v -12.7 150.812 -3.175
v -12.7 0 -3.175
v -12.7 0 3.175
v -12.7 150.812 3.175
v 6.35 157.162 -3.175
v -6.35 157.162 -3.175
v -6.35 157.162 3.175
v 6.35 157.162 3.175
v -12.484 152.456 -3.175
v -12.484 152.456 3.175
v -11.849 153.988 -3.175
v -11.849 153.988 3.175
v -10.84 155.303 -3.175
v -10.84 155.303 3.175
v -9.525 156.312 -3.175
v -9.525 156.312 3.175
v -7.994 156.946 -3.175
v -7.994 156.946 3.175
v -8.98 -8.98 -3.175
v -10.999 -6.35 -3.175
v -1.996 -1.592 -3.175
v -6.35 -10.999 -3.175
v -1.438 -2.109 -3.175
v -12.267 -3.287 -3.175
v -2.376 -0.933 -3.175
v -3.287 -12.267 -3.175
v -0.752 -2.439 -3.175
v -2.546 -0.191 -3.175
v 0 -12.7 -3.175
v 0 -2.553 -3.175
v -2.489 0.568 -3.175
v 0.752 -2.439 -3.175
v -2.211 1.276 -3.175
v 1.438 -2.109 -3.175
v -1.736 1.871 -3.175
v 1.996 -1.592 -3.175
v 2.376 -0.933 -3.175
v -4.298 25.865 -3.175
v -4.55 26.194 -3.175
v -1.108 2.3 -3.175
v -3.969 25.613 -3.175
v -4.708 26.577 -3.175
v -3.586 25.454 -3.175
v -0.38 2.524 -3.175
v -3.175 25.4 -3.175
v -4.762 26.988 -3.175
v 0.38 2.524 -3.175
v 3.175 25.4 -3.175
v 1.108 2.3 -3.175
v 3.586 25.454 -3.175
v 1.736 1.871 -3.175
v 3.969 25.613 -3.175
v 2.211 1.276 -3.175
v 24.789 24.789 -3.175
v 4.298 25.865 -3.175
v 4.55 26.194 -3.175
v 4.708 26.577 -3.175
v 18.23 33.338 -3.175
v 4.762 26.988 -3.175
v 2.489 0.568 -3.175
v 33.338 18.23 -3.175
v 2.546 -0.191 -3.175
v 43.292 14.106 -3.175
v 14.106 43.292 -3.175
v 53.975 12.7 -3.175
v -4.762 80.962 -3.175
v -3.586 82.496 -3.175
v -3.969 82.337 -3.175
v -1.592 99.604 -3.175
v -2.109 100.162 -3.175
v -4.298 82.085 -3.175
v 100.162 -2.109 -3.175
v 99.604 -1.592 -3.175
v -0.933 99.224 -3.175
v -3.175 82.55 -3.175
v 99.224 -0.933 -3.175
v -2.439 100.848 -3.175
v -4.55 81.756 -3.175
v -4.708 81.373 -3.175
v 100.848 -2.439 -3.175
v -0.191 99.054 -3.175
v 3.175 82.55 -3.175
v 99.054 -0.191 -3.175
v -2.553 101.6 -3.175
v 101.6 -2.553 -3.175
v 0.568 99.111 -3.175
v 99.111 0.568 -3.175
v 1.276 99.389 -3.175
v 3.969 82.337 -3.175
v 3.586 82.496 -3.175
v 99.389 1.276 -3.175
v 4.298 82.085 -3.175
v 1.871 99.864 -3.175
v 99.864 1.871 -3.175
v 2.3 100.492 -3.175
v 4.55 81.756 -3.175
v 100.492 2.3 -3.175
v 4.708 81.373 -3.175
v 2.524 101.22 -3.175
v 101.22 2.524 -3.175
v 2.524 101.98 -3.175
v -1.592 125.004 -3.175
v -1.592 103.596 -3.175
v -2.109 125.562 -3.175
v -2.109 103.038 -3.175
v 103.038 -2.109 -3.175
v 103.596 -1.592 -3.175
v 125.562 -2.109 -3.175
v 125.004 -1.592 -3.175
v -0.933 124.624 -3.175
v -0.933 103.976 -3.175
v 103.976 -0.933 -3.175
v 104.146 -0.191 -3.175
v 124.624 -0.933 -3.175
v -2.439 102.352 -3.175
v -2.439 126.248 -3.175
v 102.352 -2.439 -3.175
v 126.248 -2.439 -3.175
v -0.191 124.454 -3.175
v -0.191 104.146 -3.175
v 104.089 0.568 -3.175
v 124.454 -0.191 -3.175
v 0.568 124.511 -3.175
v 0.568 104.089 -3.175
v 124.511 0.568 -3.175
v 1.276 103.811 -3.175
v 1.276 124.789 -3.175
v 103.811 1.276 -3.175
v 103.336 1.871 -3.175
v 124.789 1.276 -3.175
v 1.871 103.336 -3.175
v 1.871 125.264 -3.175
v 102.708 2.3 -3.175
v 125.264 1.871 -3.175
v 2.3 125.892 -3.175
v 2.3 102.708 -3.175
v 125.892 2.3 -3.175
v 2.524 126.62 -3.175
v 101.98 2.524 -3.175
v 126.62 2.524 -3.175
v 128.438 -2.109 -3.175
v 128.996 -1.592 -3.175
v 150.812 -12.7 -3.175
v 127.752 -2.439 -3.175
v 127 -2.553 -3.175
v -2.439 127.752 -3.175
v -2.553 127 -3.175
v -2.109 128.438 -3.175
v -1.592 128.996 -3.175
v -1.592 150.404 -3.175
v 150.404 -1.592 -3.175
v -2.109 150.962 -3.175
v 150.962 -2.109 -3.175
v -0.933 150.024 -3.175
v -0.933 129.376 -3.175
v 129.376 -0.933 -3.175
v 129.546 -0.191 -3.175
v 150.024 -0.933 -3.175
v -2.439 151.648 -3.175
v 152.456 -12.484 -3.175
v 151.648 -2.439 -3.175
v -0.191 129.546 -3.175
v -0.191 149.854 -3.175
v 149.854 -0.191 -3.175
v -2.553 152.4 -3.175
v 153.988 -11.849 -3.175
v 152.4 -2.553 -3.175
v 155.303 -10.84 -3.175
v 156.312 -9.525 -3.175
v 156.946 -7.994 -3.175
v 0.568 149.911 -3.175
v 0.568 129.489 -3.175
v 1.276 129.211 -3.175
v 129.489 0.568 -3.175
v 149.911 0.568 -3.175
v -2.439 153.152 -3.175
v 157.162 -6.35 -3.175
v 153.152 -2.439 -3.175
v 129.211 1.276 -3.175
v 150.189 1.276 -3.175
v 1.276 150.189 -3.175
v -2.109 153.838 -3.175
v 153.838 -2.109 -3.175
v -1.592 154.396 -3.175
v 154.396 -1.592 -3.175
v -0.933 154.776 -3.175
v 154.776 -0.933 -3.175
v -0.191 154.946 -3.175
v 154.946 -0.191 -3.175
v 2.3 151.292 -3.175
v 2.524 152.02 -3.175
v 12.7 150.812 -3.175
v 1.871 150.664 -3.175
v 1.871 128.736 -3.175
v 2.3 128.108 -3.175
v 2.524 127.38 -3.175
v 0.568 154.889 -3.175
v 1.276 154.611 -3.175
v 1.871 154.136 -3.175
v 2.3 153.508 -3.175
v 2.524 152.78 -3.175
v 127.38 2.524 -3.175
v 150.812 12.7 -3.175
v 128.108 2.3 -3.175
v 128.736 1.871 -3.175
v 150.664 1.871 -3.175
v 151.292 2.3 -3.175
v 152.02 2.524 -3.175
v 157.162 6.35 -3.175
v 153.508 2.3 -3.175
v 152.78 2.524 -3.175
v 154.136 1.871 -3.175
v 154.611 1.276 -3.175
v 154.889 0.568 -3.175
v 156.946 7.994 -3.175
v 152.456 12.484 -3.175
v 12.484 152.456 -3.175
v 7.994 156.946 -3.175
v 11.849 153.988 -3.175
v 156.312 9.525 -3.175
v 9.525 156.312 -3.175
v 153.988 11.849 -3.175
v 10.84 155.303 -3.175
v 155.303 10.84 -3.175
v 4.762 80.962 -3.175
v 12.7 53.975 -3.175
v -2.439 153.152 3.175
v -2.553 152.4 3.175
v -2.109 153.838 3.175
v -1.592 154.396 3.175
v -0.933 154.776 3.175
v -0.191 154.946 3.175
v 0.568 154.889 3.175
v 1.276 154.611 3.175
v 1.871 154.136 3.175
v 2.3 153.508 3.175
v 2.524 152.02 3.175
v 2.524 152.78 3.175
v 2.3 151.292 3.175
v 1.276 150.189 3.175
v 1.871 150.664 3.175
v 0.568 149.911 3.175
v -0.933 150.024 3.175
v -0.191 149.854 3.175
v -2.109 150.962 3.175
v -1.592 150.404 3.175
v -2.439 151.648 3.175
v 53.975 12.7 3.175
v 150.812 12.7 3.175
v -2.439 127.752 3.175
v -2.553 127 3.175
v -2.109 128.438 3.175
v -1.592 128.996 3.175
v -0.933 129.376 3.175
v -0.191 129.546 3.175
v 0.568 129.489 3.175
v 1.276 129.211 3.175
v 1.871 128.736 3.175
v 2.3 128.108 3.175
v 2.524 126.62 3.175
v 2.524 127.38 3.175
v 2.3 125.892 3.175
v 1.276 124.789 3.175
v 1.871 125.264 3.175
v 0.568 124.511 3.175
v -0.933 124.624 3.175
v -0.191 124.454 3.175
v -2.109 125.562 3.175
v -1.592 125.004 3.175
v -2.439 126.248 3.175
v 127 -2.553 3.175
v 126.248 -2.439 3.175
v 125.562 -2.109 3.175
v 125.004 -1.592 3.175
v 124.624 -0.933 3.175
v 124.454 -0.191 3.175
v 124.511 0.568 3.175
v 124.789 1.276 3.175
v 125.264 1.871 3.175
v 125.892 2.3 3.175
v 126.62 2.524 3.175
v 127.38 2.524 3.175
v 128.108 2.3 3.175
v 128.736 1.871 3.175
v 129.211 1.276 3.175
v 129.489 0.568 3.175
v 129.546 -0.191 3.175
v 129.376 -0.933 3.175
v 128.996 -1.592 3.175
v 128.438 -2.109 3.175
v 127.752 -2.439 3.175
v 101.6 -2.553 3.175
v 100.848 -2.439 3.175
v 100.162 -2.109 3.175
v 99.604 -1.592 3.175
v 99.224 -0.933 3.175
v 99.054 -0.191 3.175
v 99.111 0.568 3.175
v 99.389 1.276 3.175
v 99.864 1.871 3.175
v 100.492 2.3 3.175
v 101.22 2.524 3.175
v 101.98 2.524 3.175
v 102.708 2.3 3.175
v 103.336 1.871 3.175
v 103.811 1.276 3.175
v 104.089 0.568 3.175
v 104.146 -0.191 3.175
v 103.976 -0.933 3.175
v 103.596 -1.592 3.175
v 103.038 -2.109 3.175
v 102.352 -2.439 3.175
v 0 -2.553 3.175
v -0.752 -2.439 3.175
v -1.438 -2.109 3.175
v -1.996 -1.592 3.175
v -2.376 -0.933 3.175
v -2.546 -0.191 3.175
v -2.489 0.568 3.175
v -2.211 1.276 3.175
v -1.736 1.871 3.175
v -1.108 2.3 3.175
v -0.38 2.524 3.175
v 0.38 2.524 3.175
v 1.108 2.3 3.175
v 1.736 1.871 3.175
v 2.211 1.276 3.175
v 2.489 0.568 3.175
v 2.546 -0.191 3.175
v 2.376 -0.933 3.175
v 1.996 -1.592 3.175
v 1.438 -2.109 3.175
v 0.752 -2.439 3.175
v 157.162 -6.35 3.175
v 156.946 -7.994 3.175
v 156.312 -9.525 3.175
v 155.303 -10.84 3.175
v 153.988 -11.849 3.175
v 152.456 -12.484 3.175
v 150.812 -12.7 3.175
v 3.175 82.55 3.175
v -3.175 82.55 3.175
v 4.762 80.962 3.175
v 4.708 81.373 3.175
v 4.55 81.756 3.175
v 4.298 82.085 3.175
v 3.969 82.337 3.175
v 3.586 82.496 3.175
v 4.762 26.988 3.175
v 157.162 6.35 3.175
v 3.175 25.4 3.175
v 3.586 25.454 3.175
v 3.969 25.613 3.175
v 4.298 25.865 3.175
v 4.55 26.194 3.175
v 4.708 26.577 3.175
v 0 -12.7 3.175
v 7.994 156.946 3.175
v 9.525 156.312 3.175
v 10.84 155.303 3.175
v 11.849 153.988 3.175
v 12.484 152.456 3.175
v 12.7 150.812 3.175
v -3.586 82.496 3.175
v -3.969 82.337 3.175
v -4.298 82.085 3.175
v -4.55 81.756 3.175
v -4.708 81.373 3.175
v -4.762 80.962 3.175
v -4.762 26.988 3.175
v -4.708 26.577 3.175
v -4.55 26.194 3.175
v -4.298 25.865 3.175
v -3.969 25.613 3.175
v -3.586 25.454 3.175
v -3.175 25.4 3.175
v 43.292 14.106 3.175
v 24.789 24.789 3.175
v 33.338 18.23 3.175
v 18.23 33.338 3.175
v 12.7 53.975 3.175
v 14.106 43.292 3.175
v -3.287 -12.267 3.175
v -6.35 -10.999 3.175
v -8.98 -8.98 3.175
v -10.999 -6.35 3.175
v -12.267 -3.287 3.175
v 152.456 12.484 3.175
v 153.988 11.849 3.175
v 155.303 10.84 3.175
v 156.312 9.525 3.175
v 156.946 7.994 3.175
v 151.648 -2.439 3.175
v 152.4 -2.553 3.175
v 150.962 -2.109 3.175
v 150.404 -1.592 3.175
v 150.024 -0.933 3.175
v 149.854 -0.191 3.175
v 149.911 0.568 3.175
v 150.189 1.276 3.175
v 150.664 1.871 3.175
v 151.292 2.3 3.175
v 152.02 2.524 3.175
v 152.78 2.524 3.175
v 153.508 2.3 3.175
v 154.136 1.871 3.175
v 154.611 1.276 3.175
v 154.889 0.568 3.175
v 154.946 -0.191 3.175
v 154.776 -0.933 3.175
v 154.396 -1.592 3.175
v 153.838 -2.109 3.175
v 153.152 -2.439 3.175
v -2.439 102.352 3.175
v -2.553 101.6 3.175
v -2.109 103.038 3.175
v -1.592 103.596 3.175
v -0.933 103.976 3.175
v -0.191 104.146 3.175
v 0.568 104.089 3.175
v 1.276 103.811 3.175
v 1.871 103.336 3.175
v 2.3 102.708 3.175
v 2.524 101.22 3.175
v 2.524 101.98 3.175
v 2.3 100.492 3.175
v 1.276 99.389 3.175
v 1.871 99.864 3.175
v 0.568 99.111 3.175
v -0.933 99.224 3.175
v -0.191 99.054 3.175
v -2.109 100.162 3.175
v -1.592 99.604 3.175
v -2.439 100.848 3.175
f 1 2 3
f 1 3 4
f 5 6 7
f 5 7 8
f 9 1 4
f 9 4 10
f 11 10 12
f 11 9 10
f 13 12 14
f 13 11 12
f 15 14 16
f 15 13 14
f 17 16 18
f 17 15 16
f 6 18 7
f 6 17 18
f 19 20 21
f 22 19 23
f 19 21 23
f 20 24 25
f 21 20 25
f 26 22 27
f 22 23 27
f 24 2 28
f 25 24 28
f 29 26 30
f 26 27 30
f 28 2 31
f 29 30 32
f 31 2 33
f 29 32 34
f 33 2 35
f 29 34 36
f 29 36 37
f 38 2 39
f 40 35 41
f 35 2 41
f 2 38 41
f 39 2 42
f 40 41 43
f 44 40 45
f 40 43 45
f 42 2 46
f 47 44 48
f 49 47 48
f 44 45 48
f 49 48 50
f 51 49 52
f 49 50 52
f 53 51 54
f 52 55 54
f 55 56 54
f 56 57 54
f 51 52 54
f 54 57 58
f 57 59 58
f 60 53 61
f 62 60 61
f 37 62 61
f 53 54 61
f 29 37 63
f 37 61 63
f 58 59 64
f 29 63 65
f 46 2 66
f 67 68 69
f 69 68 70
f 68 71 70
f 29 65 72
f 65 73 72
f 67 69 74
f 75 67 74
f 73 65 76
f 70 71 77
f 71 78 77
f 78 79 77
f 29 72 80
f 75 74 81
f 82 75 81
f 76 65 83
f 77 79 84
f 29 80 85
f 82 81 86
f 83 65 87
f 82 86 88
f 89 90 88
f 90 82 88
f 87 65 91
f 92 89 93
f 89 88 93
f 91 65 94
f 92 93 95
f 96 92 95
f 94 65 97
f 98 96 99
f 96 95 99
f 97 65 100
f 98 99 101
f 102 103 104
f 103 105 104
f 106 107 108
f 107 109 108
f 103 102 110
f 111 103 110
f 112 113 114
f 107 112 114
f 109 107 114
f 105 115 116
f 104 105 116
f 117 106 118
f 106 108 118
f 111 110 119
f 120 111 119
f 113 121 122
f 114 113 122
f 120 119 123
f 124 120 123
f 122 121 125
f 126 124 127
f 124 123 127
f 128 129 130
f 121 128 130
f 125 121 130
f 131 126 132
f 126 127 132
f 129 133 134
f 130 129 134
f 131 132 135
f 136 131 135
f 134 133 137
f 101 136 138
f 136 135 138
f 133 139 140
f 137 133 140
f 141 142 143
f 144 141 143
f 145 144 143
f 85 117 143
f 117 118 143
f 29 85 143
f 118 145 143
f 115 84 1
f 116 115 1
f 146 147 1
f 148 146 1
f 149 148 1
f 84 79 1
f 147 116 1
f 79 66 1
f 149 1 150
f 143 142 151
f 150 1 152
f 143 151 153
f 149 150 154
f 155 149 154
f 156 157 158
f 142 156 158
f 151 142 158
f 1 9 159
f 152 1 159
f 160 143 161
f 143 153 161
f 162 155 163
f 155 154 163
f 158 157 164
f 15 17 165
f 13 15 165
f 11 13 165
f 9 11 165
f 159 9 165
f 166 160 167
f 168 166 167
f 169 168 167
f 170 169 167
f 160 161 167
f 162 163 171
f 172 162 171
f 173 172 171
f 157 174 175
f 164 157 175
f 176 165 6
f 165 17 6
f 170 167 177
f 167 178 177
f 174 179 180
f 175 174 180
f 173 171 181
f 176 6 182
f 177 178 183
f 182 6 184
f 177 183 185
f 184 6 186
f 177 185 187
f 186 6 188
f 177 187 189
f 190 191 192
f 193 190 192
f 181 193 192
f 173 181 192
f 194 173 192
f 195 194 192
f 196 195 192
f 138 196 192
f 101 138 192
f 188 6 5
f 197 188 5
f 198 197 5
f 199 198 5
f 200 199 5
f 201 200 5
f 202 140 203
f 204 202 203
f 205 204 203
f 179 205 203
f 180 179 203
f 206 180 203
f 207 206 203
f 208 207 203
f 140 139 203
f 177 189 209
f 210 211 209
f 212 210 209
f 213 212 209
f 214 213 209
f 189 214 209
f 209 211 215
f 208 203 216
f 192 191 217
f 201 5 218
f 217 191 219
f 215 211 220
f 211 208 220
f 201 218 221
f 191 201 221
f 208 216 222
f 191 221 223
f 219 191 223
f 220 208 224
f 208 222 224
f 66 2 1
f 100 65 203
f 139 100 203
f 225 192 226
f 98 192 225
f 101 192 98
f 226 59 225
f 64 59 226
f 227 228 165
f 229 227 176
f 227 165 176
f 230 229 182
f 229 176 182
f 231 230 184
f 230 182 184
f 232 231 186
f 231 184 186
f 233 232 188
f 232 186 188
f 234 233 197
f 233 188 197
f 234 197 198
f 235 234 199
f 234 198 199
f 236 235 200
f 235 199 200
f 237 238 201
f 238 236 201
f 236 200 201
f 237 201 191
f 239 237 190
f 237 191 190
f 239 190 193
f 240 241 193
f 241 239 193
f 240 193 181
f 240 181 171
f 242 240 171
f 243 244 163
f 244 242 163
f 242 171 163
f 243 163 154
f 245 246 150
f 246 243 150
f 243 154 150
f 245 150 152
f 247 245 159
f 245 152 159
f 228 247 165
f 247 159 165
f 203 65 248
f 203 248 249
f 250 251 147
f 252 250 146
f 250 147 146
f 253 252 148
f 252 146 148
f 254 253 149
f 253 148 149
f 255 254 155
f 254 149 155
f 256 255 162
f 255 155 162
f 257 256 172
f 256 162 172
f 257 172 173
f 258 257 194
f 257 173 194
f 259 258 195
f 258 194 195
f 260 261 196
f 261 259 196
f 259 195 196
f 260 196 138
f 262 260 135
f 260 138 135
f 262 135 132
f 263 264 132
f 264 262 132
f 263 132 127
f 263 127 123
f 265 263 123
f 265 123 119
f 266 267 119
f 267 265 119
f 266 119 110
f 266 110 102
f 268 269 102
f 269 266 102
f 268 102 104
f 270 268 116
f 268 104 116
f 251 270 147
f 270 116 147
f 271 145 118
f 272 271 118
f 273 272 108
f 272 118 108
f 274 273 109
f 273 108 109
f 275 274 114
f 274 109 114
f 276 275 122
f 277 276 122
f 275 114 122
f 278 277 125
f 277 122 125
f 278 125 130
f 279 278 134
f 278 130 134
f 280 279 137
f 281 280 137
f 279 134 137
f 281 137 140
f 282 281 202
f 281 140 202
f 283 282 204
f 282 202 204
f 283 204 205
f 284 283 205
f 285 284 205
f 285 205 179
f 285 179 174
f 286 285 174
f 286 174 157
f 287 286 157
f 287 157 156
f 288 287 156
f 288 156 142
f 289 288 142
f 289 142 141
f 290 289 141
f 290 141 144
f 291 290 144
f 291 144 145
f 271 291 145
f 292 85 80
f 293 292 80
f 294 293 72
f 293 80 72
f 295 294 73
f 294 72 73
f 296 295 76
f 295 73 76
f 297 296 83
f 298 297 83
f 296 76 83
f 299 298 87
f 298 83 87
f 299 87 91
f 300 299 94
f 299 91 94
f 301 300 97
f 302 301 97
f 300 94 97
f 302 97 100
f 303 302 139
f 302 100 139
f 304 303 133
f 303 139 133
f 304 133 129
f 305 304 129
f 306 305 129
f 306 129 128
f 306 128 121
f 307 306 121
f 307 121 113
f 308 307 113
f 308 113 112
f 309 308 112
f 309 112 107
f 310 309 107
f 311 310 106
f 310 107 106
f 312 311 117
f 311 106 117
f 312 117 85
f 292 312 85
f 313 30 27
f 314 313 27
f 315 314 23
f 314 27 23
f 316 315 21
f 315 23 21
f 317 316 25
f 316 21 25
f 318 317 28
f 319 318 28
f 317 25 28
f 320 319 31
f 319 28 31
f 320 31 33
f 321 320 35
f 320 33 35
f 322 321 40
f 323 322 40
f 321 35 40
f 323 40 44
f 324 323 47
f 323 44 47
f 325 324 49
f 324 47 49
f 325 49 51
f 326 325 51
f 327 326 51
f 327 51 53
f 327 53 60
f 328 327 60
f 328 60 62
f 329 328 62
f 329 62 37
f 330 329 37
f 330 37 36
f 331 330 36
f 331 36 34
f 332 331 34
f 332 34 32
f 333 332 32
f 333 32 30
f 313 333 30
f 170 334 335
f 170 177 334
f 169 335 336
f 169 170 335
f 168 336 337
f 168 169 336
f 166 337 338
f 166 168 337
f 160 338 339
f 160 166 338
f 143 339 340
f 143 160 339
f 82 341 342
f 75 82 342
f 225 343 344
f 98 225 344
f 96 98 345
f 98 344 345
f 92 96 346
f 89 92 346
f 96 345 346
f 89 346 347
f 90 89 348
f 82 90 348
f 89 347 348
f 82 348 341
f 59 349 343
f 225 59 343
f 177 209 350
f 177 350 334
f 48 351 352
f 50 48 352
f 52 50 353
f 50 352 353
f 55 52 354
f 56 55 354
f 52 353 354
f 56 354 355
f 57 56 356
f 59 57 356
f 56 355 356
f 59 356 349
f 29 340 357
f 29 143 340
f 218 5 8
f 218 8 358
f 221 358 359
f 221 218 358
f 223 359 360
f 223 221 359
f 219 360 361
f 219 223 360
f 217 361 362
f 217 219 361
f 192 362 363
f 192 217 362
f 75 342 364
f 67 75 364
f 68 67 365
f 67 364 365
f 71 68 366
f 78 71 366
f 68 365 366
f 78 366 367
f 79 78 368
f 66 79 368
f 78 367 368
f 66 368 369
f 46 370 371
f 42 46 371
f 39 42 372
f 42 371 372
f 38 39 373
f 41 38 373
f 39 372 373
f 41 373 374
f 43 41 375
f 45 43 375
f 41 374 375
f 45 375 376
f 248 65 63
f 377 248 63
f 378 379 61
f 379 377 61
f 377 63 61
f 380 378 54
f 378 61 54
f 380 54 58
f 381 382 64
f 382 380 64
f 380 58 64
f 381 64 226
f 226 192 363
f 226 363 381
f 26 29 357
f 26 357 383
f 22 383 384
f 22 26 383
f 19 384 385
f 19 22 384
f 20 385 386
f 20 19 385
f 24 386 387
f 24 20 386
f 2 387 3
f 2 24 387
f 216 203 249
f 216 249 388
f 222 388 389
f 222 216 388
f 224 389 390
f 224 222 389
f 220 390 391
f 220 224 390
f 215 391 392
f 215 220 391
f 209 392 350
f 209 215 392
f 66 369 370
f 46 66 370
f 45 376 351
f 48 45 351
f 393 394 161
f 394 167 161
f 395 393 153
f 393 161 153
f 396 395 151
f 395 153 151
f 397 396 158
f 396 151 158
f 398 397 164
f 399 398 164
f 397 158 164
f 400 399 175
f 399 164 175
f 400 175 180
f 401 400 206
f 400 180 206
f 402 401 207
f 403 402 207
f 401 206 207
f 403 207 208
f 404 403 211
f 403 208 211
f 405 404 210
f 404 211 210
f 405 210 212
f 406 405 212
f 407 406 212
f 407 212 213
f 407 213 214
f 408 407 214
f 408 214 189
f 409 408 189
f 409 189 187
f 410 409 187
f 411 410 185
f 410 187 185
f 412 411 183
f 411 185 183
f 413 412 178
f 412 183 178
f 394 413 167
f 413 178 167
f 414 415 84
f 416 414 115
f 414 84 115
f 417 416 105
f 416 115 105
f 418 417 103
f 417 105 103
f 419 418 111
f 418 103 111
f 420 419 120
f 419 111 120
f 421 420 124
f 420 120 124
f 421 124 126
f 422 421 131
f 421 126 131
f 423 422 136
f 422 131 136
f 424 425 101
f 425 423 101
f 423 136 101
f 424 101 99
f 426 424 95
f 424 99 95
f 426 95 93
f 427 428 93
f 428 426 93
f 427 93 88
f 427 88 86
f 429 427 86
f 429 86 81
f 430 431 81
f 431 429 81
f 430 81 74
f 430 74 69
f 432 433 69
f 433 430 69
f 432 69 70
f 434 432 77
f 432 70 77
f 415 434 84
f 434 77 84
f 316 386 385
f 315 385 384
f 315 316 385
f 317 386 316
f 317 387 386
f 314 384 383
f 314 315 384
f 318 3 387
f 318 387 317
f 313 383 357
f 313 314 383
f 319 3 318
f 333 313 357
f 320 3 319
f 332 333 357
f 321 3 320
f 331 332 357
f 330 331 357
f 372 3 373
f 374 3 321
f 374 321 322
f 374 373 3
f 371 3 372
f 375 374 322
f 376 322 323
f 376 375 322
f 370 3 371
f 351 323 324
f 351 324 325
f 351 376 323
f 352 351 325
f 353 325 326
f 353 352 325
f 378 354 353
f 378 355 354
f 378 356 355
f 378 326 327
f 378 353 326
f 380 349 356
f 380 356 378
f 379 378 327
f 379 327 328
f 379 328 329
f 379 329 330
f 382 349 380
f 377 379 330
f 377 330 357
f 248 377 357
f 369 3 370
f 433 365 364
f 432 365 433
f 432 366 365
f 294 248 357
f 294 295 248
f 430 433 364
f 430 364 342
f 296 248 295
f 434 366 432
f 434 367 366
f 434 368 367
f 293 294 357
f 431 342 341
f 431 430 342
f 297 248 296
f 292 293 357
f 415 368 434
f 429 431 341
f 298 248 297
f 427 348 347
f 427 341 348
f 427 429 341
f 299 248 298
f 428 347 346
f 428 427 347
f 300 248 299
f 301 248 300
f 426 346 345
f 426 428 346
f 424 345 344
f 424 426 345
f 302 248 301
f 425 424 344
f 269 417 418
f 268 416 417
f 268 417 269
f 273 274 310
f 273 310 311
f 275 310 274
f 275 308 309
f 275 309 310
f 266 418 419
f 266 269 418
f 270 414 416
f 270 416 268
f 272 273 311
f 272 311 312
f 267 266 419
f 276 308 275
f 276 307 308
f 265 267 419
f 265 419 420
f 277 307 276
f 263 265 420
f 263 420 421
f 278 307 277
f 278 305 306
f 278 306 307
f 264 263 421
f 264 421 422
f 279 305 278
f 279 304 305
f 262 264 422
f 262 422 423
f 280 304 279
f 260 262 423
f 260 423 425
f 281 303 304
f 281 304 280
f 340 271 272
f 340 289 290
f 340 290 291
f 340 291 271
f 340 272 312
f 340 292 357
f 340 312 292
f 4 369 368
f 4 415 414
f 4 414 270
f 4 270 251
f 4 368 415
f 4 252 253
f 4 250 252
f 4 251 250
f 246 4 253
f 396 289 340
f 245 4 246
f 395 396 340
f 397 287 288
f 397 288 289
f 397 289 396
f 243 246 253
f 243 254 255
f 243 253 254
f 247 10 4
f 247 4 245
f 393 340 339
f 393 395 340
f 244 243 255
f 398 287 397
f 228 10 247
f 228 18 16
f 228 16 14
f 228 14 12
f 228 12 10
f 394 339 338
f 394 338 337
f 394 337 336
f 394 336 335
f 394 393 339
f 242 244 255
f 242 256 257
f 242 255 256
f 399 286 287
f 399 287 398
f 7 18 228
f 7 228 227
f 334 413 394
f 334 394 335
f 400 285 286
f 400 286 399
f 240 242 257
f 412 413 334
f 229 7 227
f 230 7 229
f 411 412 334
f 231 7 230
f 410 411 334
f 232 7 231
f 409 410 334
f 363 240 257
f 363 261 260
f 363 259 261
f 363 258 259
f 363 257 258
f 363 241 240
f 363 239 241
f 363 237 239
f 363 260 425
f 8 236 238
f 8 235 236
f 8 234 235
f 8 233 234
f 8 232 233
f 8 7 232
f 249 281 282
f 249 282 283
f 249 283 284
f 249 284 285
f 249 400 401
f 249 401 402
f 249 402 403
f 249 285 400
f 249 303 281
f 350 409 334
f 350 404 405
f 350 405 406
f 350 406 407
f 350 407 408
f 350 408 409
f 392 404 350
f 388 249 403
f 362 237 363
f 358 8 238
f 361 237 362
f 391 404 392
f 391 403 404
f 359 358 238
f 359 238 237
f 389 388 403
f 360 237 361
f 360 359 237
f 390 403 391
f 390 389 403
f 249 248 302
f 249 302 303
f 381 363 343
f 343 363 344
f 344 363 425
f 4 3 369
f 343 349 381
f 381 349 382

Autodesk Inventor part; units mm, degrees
ref_plane "Work Plane2" through (0, 0, 0) normal (-0.7071, 0.7071, 0) x (0, 0, 1)
ref_plane "XY Plane" through (0, 0, 0) normal (0, 0, 1) x (1, 0, 0)
ref_plane "Work Plane2" through (0, 0, 0) normal (-0.7071, 0.7071, 0) x (0, 0, 1)
sketch "Sketch1" plane through (-160.3375, 44.45, 0) normal (0, 0, 1) x (1, 0, 0)
  line L0 (311.15, -57.15) -> (160.3375, -57.15)
  arc A0 (311.15, -57.15) -> (317.5, -50.8) centre (311.15, -50.8) ccw
  line L1 (317.5, -38.1) -> (317.5, -50.8)
  arc A1 (317.5, -38.1) -> (311.15, -31.75) centre (311.15, -38.1) ccw
  line L2 (214.3125, -31.75) -> (311.15, -31.75)
  line L3 (173.0375, 106.3625) -> (173.0375, 9.525)
  arc A2 (173.0375, 106.3625) -> (166.6875, 112.7125) centre (166.6875, 106.3625) ccw
  line L4 (153.9875, 112.7125) -> (166.6875, 112.7125)
  arc A3 (153.9875, 112.7125) -> (147.6375, 106.3625) centre (153.9875, 106.3625) ccw
  line L5 (147.6375, -44.45) -> (147.6375, 106.3625)
  arc A4 (147.6375, -44.45) -> (160.3375, -57.15) centre (160.3375, -44.45) ccw
  line L6 (160.3375, -94.5418) -> (160.3375, 148.7892) construction
  line L7 (110.2457, -44.45) -> (353.5767, -44.45) construction
  arc A5 (173.0375, 9.525) -> (214.3125, -31.75) centre (214.3125, 9.525) ccw
  dimension "d1" = 169.8625
  dimension "d2" = 12.7
  dimension "d5" = 25.4
  dimension "d6" = 25.4
  dimension "d8" = 6.35
  dimension "d44" = 41.275
extrude "Extrusion1" add sketch "Sketch1" along normal mid plane 6.35
sketch "Sketch2" plane through (-160.3375, 44.45, 3.175) normal (0, 0, 1) x (1, 0, 0)
  line L0 (160.3375, -91.1225) -> (160.3375, 146.685) construction
  line L1 (113.665, -44.45) -> (351.4725, -44.45) construction
  line L2 (317.5, -50.8) -> (317.5, -38.1) construction
  point P0 (160.3375, -44.45)
  point P1 (312.7375, -44.45)
  dimension "d13" = 152.4
hole "Hole1" at (152.4, 0, 3.175) direction (0, 0, -1) diameter 5.1054 end through all clearance for "Socket Head Cap Screw" size "#10" standard "Ansi Unified Screw Threads"
pattern_linear "Rectangular Pattern1" count 3 spacing 25.4 along (-1, 0, 0) of "Hole1"
sketch "Sketch4" plane through (-160.3375, 44.45, 3.175) normal (0, 0, 1) x (1, 0, 0)
  point P0 (160.3375, -44.45)
  point P1 (160.3375, -44.45)
hole "Hole2" at (0, 0, 3.175) direction (0, 0, -1) diameter 5.1054 end through all clearance for "Socket Head Cap Screw" size "#10" standard "Ansi Unified Screw Threads"
mirror "Mirror1" about plane through (0, 0, 0) normal (-0.7071, 0.7071, 0) of "Hole1", "Rectangular Pattern1"
sketch "Sketch5" plane through (-160.3375, 44.45, 3.175) normal (0, 0, 1) x (1, 0, 0)
  line L0 (163.5125, 38.1) -> (157.1625, 38.1)
  line L1 (155.575, 36.5125) -> (155.575, -17.4625)
  line L2 (157.1625, -19.05) -> (163.5125, -19.05)
  line L3 (165.1, -17.4625) -> (165.1, 36.5125)
  line L4 (160.3375, -91.1225) -> (160.3375, 146.685) construction
  arc A0 (165.1, 36.5125) -> (163.5125, 38.1) centre (163.5125, 36.5125) ccw
  arc A1 (157.1625, 38.1) -> (155.575, 36.5125) centre (157.1625, 36.5125) ccw
  arc A2 (155.575, -17.4625) -> (157.1625, -19.05) centre (157.1625, -17.4625) ccw
  arc A3 (163.5125, -19.05) -> (165.1, -17.4625) centre (163.5125, -17.4625) ccw
  point P0 (160.3375, -44.45)
  point P1 (155.575, -19.05)
  point P2 (155.575, 38.1)
  point P3 (165.1, -19.05)
  dimension "d45" = 9.525
  dimension "d46" = 25.4
  dimension "d47" = 57.15
  dimension "d48" = 1.5875
extrude "Extrusion3" cut sketch "Sketch5" against normal up to surface (6.35 mm away)
properties part number "PLATE,CLAMP,MK4i,Swerve,CUSTOM,FRC2026" material "Aluminum 7075"
